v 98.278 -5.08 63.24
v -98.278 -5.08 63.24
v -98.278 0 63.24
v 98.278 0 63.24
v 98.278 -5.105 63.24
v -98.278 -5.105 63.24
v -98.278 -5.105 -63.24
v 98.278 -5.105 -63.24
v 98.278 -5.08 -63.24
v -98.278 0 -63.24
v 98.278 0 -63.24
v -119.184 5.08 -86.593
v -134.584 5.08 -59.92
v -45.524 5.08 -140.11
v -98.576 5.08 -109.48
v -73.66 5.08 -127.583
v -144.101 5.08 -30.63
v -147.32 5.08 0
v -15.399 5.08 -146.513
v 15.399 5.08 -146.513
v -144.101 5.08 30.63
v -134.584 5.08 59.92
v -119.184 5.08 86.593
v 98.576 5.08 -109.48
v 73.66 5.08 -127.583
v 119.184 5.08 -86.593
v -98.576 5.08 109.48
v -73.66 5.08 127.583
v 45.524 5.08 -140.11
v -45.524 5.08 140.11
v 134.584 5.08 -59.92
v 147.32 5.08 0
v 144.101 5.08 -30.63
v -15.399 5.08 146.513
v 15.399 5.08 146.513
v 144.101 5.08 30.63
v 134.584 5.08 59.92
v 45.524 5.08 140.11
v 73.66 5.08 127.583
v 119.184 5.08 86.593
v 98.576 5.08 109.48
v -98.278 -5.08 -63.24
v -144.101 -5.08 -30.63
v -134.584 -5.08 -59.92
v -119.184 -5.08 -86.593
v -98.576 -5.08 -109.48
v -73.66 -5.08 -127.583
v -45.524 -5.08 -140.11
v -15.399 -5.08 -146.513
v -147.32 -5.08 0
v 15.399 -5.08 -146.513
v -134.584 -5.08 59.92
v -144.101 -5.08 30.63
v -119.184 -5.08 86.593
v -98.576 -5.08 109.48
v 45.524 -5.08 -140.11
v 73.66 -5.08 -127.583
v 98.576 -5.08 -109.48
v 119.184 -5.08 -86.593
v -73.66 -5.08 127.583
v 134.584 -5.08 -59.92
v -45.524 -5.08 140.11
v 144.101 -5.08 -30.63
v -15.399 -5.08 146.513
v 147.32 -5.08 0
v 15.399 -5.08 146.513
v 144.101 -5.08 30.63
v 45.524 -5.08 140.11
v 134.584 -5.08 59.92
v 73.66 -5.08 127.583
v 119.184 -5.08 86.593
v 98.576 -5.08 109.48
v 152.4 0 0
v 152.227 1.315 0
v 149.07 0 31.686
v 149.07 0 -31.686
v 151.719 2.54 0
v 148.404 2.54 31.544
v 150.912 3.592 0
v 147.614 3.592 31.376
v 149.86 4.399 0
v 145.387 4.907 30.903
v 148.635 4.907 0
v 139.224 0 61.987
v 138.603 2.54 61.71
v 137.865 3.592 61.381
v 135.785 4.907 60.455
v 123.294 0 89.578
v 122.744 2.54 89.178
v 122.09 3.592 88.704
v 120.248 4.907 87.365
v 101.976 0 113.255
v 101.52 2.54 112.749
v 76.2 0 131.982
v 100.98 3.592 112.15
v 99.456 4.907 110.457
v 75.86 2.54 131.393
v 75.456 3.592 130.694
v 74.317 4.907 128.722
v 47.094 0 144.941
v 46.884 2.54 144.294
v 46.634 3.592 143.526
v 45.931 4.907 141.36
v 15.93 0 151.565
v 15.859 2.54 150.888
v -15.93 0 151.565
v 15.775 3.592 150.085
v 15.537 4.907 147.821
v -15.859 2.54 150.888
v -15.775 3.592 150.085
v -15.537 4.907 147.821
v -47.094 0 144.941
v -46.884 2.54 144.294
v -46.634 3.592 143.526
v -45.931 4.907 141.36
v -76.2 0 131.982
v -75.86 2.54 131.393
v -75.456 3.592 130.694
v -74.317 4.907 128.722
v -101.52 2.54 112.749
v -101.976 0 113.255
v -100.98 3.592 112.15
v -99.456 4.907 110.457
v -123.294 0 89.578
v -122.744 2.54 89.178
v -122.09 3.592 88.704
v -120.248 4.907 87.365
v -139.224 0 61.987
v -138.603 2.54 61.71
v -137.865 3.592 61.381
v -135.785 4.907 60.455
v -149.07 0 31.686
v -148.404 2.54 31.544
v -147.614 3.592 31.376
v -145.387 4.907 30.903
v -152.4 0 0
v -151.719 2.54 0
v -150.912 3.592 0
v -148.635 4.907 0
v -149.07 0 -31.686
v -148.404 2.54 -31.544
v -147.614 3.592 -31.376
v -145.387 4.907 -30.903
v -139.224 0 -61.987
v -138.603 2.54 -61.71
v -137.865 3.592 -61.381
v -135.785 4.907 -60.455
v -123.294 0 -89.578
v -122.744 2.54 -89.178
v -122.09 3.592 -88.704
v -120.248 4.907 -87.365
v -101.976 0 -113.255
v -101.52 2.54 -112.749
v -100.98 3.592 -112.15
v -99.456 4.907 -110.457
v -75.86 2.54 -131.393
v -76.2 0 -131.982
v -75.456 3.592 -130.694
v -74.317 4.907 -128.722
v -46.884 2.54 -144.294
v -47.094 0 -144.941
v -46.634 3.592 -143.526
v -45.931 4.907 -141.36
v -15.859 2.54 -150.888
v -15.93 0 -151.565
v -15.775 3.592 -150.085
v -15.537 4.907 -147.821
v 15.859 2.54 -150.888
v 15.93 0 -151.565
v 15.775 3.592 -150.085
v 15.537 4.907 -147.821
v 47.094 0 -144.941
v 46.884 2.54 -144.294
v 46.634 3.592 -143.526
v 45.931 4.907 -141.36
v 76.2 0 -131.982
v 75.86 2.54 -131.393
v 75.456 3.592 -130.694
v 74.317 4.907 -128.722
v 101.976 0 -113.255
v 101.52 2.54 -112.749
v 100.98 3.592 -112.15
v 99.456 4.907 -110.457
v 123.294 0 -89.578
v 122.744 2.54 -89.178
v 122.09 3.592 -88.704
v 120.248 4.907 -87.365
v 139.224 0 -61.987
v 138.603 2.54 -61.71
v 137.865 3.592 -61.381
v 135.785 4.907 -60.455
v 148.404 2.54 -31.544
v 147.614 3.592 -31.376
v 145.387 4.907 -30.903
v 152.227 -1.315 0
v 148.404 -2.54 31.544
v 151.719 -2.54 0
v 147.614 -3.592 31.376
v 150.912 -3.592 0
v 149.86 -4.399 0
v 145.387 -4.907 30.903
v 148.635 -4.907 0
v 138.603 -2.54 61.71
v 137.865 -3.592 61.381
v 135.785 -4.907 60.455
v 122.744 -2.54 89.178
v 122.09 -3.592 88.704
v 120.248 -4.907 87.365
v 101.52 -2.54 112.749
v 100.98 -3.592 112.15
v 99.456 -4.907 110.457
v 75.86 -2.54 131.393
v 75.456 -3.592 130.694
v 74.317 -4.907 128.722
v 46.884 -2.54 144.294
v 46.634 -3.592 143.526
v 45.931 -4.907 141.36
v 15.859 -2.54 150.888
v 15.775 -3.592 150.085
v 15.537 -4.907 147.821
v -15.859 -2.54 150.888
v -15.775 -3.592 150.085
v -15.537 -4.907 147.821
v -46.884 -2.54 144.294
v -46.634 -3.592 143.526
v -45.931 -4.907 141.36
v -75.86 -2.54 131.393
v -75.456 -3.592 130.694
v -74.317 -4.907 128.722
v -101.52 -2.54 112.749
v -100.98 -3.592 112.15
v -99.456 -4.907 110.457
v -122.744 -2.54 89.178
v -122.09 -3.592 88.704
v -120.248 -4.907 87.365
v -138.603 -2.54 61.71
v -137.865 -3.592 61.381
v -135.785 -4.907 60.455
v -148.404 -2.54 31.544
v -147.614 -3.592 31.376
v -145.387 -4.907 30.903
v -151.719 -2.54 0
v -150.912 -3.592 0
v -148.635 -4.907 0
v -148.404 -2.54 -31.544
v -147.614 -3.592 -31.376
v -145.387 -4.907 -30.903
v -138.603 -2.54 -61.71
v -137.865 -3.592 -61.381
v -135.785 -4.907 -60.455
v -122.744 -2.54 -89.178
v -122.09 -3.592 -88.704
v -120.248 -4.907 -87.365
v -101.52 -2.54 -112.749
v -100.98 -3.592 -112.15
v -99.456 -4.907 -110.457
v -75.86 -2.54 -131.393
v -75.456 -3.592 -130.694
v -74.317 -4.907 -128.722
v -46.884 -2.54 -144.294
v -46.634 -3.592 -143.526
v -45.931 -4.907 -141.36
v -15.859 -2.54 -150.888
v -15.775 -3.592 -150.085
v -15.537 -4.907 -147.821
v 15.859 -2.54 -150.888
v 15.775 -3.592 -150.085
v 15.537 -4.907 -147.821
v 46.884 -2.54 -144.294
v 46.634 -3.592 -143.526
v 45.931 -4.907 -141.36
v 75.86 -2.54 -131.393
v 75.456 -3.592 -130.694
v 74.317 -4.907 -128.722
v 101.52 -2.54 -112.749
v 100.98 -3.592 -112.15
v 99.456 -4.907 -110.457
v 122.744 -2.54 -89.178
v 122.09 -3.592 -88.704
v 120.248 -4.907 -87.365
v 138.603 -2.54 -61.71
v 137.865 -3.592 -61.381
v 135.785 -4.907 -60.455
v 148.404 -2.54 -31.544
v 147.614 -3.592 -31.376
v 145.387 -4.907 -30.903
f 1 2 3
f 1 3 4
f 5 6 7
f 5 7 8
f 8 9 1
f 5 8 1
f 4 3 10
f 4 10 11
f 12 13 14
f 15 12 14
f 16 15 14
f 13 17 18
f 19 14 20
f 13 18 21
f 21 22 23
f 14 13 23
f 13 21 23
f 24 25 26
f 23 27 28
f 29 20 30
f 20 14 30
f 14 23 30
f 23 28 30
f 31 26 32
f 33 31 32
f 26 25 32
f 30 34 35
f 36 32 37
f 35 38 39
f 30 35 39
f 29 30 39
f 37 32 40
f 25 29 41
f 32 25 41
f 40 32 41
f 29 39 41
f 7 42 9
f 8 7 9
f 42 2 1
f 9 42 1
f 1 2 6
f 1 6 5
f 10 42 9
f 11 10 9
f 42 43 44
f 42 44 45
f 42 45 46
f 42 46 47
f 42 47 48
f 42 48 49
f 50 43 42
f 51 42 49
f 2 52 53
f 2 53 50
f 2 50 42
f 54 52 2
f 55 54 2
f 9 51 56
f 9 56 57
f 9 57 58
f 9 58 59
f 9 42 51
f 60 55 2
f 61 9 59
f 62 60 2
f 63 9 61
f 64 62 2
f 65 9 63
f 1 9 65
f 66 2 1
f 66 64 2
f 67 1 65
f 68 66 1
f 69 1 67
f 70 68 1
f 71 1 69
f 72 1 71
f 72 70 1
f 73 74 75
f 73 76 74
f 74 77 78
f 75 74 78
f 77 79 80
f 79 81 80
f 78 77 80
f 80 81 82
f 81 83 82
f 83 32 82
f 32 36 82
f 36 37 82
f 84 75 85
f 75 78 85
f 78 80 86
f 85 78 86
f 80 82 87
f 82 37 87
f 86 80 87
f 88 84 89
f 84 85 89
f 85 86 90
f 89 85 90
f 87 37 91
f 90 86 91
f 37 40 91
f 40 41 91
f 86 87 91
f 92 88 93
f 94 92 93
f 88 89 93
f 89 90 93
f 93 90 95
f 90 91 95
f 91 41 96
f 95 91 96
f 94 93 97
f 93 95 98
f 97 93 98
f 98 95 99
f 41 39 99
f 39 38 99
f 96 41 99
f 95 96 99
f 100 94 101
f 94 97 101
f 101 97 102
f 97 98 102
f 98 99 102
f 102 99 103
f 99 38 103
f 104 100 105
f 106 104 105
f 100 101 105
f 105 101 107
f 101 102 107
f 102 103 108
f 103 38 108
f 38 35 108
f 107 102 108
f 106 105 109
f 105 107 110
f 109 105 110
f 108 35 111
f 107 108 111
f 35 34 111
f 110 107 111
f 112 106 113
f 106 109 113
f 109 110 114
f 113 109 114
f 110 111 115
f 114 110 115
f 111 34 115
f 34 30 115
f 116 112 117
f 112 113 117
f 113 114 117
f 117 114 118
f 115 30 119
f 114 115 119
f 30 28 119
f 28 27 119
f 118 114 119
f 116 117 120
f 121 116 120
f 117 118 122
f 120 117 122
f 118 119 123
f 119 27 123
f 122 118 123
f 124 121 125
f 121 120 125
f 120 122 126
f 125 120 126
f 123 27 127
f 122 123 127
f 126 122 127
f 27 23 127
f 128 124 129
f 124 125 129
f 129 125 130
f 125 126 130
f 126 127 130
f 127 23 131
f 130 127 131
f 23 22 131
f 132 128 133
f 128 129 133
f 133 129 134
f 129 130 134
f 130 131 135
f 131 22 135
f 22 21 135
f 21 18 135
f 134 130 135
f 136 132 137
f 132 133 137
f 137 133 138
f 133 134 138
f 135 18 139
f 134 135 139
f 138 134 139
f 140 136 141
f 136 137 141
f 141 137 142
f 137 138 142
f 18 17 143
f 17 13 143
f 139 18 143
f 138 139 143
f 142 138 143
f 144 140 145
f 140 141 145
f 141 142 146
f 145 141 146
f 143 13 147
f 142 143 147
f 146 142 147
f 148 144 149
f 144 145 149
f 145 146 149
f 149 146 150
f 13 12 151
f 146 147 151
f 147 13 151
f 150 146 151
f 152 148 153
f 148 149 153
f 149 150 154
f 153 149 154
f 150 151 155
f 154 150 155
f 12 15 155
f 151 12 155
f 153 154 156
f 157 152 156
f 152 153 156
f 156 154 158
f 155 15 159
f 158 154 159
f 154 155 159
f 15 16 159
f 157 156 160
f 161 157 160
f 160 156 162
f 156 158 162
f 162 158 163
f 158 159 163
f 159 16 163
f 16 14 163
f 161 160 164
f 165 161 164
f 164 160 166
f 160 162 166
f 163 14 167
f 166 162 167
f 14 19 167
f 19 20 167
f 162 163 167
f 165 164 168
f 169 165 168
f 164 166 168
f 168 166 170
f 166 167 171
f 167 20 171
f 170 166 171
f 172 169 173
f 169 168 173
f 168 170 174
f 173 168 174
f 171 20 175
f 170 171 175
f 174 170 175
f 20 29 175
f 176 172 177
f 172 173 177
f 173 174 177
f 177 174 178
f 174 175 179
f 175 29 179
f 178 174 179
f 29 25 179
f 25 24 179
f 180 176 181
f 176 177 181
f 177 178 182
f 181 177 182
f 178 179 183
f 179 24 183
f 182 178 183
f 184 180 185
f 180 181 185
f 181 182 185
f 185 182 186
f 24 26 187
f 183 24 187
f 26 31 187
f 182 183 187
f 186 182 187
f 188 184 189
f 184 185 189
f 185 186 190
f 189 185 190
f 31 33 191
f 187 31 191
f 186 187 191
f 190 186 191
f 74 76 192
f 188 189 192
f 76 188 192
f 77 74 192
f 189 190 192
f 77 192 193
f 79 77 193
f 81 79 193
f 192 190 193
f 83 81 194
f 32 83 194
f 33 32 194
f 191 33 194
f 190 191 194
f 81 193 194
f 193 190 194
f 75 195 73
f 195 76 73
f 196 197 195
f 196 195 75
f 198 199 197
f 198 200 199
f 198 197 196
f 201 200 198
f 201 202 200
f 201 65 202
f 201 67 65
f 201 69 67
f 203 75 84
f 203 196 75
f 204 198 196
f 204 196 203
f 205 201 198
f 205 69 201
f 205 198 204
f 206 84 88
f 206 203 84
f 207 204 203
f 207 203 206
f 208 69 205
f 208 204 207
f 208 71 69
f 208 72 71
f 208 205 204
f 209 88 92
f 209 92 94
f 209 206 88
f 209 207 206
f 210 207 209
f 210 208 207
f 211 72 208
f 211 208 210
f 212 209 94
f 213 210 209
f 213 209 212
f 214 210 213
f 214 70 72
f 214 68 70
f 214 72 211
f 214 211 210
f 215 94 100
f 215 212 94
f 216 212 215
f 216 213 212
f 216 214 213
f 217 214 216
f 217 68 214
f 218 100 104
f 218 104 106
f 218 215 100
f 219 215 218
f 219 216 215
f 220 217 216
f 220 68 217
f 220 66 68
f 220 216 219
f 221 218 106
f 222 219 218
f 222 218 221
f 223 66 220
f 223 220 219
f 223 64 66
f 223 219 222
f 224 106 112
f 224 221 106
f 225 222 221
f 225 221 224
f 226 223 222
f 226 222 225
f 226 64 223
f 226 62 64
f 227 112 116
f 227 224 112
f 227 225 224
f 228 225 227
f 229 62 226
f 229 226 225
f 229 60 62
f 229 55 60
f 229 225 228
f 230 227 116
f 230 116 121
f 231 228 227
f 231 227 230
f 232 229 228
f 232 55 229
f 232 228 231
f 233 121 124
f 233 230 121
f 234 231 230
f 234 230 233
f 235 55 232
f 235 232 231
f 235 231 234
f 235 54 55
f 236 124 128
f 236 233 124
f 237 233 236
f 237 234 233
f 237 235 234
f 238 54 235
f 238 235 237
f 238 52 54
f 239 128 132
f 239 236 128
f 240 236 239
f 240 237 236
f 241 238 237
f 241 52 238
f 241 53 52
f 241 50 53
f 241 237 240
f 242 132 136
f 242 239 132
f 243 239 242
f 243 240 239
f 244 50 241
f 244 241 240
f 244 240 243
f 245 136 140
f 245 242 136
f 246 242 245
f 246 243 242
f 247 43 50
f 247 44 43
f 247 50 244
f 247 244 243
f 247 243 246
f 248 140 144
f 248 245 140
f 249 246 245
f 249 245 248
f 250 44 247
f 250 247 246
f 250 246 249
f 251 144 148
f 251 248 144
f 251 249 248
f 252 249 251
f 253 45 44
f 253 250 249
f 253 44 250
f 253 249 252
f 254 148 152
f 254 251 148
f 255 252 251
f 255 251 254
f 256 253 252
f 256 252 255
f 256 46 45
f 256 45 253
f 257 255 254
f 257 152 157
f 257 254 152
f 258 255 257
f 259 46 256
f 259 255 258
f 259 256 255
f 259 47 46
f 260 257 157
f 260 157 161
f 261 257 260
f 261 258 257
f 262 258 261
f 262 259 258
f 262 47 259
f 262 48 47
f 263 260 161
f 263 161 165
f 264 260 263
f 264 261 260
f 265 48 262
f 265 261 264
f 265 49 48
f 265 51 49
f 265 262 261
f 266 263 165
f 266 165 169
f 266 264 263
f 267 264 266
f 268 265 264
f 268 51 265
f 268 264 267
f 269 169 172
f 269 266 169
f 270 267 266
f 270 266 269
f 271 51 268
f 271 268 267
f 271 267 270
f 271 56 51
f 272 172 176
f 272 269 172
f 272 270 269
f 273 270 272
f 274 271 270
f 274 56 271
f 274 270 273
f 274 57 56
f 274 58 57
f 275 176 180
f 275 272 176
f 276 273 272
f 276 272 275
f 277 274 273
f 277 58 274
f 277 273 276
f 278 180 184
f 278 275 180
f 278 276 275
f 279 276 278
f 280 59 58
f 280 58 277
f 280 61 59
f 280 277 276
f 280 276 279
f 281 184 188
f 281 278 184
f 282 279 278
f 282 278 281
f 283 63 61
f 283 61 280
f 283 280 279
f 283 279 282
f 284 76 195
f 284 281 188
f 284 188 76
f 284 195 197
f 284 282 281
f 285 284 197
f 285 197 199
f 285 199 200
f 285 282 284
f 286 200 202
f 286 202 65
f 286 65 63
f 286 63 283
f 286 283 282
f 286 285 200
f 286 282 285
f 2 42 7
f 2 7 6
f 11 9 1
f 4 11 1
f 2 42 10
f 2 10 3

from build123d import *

# Parameters (mm, degrees)
F0_R     = 152.4
F0_W     = 196.5556636505
F0_H     = 126.4792977641
F1_DEPTH = 5.08
F3_R     = 5.07999
F4_DEPTH = 5.08
F5_W     = 196.5556636505
F5_H     = 126.4792977641
F6_DEPTH = 0.0254


# Not quite as in the source:
# - a fillet or chamfer is up to 0.001 mm smaller than in the source, because OpenCascade refuses the exact size
# - the program builds the solid bodies; features that only make, move or delete a surface that nothing else refers to are left out


with BuildPart() as f1:
    # F0 (on Front) → F1 (new body, symmetric)
    with BuildSketch(Plane.XZ):
        Circle(F0_R)
        Rectangle(F0_W, F0_H, mode=Mode.SUBTRACT)
    extrude(amount=F1_DEPTH, both=True)

    # F3 (radius 5.08 in the source; OpenCascade refuses exactly that, so slightly less here)
    f3_edges = [f1.edges().sort_by_distance(p)[0] for p in [
        (-152.4, 5.08, 0),
        (-152.4, -5.08, 0),
    ]]
    fillet(f3_edges, radius=F3_R)

    # F0 (on Front) → F4 (join)
    with BuildSketch(Plane.XZ):
        Rectangle(F0_W, F0_H)
    extrude(amount=-F4_DEPTH)


with BuildPart() as f6:
    # F5 (on face) → F6 (new body)
    with BuildSketch(Plane.XZ.offset(5.08)):
        Rectangle(F5_W, F5_H)
    extrude(amount=F6_DEPTH)


solid = Compound([f1.part, f6.part])
